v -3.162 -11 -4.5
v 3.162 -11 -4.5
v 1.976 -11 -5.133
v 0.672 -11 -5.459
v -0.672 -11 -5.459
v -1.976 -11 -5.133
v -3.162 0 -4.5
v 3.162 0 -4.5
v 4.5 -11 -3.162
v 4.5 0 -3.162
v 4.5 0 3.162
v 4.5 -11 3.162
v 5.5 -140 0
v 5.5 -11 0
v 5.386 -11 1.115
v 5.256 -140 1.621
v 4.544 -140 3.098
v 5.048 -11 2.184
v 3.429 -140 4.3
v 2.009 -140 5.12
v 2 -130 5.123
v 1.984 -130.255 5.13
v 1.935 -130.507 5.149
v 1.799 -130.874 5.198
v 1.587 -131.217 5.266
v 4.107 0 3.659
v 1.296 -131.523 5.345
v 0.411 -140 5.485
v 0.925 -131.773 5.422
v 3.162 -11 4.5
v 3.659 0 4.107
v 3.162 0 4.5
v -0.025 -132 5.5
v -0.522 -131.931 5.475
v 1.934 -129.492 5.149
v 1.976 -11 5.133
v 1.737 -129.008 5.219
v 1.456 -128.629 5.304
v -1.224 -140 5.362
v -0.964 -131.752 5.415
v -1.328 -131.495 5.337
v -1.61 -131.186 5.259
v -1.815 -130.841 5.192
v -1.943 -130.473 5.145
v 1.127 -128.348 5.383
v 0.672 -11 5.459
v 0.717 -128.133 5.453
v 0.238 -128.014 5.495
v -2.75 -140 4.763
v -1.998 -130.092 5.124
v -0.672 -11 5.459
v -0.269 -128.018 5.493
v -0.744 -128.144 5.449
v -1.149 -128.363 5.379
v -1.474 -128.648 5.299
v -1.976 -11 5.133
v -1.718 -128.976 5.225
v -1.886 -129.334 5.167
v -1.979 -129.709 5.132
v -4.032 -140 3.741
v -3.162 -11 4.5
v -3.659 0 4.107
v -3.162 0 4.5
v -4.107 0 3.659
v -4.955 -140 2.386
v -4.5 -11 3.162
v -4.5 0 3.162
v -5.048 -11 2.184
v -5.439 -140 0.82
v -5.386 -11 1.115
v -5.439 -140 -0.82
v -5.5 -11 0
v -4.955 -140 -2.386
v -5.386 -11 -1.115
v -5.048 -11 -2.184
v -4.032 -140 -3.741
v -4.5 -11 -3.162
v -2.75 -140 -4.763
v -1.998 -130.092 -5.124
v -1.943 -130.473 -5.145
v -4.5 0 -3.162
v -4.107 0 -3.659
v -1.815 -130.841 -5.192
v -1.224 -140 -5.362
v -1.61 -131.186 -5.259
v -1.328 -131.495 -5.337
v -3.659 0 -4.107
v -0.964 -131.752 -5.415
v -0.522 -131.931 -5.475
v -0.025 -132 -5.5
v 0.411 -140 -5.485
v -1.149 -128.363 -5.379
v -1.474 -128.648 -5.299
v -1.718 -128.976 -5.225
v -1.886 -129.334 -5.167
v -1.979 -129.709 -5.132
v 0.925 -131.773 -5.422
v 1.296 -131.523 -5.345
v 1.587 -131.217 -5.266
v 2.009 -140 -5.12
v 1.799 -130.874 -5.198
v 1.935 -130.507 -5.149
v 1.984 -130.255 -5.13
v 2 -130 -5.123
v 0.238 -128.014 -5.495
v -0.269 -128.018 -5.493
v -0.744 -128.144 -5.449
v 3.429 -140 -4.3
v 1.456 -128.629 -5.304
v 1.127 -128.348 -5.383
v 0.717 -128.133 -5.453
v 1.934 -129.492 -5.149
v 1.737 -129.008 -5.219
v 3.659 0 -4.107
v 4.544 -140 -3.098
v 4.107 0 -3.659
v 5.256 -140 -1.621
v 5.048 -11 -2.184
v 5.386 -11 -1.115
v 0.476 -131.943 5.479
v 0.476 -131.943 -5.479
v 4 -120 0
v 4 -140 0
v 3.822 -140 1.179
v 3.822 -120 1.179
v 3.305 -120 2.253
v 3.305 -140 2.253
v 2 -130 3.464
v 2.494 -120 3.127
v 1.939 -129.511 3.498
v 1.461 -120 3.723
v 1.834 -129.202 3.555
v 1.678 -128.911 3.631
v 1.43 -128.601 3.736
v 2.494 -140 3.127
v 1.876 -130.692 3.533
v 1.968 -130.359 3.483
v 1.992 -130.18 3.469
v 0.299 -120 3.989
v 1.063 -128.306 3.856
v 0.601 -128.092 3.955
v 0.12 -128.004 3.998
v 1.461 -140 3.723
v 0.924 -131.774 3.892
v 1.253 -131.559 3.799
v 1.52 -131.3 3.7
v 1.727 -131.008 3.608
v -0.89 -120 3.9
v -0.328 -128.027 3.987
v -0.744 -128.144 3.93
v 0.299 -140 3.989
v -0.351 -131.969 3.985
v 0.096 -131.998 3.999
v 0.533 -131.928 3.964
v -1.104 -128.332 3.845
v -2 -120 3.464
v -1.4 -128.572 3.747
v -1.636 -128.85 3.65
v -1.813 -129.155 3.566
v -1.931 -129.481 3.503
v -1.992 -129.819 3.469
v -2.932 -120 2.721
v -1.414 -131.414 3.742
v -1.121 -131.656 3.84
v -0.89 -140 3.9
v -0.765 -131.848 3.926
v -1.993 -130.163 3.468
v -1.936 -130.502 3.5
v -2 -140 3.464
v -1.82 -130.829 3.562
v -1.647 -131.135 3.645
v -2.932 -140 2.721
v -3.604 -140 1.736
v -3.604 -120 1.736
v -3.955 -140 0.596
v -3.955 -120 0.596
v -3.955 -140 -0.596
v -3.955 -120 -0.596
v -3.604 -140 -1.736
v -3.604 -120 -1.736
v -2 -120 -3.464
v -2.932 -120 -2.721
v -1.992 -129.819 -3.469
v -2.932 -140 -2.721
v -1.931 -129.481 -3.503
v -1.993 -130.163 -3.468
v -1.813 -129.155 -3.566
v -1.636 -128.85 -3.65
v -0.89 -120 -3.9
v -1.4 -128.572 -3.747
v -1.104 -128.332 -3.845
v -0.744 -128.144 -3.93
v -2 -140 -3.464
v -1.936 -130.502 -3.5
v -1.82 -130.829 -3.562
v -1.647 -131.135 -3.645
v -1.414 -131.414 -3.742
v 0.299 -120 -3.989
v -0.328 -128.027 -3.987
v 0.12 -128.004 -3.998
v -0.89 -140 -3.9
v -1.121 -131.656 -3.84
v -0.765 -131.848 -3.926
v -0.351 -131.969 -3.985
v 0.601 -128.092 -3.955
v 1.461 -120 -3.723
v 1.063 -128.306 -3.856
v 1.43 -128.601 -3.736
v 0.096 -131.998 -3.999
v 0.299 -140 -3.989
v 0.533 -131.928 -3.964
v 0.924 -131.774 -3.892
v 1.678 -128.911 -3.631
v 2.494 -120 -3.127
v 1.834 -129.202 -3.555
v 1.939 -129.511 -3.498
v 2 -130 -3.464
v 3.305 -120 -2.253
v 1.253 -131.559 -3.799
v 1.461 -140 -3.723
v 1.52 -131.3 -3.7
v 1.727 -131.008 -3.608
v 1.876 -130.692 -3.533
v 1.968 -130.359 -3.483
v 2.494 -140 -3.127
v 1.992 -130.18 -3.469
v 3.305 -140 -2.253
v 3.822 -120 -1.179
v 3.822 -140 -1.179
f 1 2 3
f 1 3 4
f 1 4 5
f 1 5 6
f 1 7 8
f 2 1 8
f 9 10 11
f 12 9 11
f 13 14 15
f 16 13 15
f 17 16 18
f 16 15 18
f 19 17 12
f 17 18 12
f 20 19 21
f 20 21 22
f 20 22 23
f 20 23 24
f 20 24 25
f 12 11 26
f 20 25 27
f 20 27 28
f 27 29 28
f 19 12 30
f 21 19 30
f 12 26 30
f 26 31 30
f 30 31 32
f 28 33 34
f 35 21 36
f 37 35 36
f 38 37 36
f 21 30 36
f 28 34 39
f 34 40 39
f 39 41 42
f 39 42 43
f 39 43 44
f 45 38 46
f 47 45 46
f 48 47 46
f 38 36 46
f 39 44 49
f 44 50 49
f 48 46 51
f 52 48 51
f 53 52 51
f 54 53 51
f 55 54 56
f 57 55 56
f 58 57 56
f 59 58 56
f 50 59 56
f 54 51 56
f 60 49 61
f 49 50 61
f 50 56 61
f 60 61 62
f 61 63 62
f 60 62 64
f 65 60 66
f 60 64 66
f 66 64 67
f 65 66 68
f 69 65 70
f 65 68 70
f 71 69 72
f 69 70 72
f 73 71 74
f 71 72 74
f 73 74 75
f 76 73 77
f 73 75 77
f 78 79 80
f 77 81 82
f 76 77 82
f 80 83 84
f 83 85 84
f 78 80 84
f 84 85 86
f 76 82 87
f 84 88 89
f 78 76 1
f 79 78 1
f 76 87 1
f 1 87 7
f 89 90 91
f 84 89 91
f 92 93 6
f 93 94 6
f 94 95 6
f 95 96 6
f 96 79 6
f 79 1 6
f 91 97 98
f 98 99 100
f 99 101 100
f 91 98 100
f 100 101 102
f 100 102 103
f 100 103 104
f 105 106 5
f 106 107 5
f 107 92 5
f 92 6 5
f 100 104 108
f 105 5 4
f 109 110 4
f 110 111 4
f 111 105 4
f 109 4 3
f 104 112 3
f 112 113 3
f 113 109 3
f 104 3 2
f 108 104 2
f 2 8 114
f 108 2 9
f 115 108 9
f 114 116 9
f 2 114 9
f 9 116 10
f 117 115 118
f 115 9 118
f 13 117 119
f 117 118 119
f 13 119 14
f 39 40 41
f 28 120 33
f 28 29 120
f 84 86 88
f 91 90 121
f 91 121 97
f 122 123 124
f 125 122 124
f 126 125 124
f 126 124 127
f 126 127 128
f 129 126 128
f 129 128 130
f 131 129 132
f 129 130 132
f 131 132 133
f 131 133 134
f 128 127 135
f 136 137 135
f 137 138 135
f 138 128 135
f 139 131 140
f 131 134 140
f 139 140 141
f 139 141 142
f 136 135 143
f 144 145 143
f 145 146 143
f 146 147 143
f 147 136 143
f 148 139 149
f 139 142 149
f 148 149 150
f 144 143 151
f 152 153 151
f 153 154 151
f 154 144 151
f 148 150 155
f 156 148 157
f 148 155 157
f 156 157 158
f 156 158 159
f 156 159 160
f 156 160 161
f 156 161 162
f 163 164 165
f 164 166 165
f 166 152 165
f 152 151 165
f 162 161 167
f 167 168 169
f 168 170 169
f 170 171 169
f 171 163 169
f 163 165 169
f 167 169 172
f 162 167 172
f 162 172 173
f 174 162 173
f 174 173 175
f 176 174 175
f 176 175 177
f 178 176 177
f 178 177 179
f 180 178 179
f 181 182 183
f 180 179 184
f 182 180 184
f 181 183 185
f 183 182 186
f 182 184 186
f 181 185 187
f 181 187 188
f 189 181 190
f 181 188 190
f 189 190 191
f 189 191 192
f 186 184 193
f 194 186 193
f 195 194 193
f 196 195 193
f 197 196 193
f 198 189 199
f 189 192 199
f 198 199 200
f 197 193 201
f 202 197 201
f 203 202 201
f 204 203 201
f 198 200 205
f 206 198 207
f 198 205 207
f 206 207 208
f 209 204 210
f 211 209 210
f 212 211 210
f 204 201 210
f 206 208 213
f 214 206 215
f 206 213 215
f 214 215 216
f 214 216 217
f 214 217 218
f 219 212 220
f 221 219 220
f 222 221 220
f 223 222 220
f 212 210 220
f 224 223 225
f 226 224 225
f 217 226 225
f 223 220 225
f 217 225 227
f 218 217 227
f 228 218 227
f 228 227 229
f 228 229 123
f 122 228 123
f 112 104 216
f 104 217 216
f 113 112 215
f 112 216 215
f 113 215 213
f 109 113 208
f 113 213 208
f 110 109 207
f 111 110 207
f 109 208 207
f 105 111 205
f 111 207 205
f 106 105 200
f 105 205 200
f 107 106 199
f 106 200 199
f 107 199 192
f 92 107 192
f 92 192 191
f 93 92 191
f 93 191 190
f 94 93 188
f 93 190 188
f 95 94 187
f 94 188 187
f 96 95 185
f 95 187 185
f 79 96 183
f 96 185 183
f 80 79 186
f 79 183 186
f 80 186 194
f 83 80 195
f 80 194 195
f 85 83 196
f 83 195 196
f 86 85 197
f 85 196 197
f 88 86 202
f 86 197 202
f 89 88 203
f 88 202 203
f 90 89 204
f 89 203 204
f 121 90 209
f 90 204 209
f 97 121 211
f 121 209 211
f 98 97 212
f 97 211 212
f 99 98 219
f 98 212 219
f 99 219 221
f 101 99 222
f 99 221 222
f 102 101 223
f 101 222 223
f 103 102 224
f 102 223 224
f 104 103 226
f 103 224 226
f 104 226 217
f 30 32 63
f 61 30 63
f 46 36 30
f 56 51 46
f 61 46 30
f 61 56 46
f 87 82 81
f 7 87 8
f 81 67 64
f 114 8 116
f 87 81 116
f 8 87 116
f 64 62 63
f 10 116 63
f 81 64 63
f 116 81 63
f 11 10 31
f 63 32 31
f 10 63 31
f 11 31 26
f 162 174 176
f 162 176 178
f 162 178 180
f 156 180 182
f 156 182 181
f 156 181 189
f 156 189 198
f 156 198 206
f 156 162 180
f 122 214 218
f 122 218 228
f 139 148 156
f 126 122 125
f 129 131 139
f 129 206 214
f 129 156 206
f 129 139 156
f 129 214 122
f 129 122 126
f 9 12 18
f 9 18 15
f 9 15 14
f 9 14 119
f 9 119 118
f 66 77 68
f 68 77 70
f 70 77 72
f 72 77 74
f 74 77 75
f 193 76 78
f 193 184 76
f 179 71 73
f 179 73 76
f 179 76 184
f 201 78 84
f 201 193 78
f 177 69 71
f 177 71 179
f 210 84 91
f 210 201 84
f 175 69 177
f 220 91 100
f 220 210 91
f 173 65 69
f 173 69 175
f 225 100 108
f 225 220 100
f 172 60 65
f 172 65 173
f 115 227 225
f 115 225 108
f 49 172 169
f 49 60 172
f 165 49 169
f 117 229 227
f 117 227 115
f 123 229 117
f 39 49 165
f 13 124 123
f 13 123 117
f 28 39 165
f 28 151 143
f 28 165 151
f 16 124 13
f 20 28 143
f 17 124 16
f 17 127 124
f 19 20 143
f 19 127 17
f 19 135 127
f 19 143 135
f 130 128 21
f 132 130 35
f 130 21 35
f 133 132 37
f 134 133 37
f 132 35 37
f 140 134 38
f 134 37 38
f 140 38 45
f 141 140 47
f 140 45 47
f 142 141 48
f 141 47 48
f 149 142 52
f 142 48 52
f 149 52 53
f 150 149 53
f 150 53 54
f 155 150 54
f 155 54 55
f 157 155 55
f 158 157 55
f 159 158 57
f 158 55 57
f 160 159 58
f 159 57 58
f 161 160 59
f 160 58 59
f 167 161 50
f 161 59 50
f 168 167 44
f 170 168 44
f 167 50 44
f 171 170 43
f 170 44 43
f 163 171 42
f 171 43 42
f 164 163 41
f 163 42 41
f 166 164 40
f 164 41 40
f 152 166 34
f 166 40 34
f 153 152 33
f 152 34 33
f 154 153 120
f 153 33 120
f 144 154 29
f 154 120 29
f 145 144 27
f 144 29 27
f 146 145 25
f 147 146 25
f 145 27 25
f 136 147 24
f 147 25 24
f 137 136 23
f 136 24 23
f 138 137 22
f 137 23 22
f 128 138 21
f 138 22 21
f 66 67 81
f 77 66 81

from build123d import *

# Parameters (mm, degrees)
F0_R     = 5.5
F1_DEPTH = 140
F2_R     = 4
F3_DEPTH = 20
F5_DEPTH = 11
F6_R     = 2
F7_DEPTH = 12.5


with BuildPart() as f1:
    # F0 (on Front) → F1 (new body)
    with BuildSketch(Plane.XZ):
        Circle(F0_R)
    extrude(amount=F1_DEPTH)

    # F2 (on face) → F3 (cut)
    with BuildSketch(Plane.XZ.offset(140)):
        Circle(F2_R)
    extrude(amount=-F3_DEPTH, mode=Mode.SUBTRACT)

    # F4 (on face) → F5 (cut)
    with BuildSketch(Plane(origin=(0, 0, 0), x_dir=(-1, 0, 0), z_dir=(0, 1, 0))):
        with BuildLine():
            Line((4.5, 3.1622776602), (4.5, -3.1622776602))
            ThreePointArc((4.5, -3.1622776602), (5.2440442409, -1.6583123952), (5.5, 0))
            ThreePointArc((5.5, 0), (5.2440442409, 1.6583123952), (4.5, 3.1622776602))
        make_face()
        with BuildLine():
            ThreePointArc((3.1622776602, 4.5), (0, 5.5), (-3.1622776602, 4.5))
            Line((-3.1622776602, 4.5), (3.1622776602, 4.5))
        make_face()
        with BuildLine():
            ThreePointArc((-4.5, 3.1622776602), (-5.5, 0), (-4.5, -3.1622776602))
            Line((-4.5, -3.1622776602), (-4.5, 3.1622776602))
        make_face()
        with BuildLine():
            Line((3.1622776602, -4.5), (-3.1622776602, -4.5))
            ThreePointArc((-3.1622776602, -4.5), (0, -5.5), (3.1622776602, -4.5))
        make_face()
    extrude(amount=-F5_DEPTH, mode=Mode.SUBTRACT)

    # F6 (on Top) → F7 (cut, symmetric)
    with BuildSketch(Plane.XY):
        with Locations((0, -130)):
            Circle(F6_R)
    extrude(amount=F7_DEPTH, both=True, mode=Mode.SUBTRACT)


solid = f1.part
